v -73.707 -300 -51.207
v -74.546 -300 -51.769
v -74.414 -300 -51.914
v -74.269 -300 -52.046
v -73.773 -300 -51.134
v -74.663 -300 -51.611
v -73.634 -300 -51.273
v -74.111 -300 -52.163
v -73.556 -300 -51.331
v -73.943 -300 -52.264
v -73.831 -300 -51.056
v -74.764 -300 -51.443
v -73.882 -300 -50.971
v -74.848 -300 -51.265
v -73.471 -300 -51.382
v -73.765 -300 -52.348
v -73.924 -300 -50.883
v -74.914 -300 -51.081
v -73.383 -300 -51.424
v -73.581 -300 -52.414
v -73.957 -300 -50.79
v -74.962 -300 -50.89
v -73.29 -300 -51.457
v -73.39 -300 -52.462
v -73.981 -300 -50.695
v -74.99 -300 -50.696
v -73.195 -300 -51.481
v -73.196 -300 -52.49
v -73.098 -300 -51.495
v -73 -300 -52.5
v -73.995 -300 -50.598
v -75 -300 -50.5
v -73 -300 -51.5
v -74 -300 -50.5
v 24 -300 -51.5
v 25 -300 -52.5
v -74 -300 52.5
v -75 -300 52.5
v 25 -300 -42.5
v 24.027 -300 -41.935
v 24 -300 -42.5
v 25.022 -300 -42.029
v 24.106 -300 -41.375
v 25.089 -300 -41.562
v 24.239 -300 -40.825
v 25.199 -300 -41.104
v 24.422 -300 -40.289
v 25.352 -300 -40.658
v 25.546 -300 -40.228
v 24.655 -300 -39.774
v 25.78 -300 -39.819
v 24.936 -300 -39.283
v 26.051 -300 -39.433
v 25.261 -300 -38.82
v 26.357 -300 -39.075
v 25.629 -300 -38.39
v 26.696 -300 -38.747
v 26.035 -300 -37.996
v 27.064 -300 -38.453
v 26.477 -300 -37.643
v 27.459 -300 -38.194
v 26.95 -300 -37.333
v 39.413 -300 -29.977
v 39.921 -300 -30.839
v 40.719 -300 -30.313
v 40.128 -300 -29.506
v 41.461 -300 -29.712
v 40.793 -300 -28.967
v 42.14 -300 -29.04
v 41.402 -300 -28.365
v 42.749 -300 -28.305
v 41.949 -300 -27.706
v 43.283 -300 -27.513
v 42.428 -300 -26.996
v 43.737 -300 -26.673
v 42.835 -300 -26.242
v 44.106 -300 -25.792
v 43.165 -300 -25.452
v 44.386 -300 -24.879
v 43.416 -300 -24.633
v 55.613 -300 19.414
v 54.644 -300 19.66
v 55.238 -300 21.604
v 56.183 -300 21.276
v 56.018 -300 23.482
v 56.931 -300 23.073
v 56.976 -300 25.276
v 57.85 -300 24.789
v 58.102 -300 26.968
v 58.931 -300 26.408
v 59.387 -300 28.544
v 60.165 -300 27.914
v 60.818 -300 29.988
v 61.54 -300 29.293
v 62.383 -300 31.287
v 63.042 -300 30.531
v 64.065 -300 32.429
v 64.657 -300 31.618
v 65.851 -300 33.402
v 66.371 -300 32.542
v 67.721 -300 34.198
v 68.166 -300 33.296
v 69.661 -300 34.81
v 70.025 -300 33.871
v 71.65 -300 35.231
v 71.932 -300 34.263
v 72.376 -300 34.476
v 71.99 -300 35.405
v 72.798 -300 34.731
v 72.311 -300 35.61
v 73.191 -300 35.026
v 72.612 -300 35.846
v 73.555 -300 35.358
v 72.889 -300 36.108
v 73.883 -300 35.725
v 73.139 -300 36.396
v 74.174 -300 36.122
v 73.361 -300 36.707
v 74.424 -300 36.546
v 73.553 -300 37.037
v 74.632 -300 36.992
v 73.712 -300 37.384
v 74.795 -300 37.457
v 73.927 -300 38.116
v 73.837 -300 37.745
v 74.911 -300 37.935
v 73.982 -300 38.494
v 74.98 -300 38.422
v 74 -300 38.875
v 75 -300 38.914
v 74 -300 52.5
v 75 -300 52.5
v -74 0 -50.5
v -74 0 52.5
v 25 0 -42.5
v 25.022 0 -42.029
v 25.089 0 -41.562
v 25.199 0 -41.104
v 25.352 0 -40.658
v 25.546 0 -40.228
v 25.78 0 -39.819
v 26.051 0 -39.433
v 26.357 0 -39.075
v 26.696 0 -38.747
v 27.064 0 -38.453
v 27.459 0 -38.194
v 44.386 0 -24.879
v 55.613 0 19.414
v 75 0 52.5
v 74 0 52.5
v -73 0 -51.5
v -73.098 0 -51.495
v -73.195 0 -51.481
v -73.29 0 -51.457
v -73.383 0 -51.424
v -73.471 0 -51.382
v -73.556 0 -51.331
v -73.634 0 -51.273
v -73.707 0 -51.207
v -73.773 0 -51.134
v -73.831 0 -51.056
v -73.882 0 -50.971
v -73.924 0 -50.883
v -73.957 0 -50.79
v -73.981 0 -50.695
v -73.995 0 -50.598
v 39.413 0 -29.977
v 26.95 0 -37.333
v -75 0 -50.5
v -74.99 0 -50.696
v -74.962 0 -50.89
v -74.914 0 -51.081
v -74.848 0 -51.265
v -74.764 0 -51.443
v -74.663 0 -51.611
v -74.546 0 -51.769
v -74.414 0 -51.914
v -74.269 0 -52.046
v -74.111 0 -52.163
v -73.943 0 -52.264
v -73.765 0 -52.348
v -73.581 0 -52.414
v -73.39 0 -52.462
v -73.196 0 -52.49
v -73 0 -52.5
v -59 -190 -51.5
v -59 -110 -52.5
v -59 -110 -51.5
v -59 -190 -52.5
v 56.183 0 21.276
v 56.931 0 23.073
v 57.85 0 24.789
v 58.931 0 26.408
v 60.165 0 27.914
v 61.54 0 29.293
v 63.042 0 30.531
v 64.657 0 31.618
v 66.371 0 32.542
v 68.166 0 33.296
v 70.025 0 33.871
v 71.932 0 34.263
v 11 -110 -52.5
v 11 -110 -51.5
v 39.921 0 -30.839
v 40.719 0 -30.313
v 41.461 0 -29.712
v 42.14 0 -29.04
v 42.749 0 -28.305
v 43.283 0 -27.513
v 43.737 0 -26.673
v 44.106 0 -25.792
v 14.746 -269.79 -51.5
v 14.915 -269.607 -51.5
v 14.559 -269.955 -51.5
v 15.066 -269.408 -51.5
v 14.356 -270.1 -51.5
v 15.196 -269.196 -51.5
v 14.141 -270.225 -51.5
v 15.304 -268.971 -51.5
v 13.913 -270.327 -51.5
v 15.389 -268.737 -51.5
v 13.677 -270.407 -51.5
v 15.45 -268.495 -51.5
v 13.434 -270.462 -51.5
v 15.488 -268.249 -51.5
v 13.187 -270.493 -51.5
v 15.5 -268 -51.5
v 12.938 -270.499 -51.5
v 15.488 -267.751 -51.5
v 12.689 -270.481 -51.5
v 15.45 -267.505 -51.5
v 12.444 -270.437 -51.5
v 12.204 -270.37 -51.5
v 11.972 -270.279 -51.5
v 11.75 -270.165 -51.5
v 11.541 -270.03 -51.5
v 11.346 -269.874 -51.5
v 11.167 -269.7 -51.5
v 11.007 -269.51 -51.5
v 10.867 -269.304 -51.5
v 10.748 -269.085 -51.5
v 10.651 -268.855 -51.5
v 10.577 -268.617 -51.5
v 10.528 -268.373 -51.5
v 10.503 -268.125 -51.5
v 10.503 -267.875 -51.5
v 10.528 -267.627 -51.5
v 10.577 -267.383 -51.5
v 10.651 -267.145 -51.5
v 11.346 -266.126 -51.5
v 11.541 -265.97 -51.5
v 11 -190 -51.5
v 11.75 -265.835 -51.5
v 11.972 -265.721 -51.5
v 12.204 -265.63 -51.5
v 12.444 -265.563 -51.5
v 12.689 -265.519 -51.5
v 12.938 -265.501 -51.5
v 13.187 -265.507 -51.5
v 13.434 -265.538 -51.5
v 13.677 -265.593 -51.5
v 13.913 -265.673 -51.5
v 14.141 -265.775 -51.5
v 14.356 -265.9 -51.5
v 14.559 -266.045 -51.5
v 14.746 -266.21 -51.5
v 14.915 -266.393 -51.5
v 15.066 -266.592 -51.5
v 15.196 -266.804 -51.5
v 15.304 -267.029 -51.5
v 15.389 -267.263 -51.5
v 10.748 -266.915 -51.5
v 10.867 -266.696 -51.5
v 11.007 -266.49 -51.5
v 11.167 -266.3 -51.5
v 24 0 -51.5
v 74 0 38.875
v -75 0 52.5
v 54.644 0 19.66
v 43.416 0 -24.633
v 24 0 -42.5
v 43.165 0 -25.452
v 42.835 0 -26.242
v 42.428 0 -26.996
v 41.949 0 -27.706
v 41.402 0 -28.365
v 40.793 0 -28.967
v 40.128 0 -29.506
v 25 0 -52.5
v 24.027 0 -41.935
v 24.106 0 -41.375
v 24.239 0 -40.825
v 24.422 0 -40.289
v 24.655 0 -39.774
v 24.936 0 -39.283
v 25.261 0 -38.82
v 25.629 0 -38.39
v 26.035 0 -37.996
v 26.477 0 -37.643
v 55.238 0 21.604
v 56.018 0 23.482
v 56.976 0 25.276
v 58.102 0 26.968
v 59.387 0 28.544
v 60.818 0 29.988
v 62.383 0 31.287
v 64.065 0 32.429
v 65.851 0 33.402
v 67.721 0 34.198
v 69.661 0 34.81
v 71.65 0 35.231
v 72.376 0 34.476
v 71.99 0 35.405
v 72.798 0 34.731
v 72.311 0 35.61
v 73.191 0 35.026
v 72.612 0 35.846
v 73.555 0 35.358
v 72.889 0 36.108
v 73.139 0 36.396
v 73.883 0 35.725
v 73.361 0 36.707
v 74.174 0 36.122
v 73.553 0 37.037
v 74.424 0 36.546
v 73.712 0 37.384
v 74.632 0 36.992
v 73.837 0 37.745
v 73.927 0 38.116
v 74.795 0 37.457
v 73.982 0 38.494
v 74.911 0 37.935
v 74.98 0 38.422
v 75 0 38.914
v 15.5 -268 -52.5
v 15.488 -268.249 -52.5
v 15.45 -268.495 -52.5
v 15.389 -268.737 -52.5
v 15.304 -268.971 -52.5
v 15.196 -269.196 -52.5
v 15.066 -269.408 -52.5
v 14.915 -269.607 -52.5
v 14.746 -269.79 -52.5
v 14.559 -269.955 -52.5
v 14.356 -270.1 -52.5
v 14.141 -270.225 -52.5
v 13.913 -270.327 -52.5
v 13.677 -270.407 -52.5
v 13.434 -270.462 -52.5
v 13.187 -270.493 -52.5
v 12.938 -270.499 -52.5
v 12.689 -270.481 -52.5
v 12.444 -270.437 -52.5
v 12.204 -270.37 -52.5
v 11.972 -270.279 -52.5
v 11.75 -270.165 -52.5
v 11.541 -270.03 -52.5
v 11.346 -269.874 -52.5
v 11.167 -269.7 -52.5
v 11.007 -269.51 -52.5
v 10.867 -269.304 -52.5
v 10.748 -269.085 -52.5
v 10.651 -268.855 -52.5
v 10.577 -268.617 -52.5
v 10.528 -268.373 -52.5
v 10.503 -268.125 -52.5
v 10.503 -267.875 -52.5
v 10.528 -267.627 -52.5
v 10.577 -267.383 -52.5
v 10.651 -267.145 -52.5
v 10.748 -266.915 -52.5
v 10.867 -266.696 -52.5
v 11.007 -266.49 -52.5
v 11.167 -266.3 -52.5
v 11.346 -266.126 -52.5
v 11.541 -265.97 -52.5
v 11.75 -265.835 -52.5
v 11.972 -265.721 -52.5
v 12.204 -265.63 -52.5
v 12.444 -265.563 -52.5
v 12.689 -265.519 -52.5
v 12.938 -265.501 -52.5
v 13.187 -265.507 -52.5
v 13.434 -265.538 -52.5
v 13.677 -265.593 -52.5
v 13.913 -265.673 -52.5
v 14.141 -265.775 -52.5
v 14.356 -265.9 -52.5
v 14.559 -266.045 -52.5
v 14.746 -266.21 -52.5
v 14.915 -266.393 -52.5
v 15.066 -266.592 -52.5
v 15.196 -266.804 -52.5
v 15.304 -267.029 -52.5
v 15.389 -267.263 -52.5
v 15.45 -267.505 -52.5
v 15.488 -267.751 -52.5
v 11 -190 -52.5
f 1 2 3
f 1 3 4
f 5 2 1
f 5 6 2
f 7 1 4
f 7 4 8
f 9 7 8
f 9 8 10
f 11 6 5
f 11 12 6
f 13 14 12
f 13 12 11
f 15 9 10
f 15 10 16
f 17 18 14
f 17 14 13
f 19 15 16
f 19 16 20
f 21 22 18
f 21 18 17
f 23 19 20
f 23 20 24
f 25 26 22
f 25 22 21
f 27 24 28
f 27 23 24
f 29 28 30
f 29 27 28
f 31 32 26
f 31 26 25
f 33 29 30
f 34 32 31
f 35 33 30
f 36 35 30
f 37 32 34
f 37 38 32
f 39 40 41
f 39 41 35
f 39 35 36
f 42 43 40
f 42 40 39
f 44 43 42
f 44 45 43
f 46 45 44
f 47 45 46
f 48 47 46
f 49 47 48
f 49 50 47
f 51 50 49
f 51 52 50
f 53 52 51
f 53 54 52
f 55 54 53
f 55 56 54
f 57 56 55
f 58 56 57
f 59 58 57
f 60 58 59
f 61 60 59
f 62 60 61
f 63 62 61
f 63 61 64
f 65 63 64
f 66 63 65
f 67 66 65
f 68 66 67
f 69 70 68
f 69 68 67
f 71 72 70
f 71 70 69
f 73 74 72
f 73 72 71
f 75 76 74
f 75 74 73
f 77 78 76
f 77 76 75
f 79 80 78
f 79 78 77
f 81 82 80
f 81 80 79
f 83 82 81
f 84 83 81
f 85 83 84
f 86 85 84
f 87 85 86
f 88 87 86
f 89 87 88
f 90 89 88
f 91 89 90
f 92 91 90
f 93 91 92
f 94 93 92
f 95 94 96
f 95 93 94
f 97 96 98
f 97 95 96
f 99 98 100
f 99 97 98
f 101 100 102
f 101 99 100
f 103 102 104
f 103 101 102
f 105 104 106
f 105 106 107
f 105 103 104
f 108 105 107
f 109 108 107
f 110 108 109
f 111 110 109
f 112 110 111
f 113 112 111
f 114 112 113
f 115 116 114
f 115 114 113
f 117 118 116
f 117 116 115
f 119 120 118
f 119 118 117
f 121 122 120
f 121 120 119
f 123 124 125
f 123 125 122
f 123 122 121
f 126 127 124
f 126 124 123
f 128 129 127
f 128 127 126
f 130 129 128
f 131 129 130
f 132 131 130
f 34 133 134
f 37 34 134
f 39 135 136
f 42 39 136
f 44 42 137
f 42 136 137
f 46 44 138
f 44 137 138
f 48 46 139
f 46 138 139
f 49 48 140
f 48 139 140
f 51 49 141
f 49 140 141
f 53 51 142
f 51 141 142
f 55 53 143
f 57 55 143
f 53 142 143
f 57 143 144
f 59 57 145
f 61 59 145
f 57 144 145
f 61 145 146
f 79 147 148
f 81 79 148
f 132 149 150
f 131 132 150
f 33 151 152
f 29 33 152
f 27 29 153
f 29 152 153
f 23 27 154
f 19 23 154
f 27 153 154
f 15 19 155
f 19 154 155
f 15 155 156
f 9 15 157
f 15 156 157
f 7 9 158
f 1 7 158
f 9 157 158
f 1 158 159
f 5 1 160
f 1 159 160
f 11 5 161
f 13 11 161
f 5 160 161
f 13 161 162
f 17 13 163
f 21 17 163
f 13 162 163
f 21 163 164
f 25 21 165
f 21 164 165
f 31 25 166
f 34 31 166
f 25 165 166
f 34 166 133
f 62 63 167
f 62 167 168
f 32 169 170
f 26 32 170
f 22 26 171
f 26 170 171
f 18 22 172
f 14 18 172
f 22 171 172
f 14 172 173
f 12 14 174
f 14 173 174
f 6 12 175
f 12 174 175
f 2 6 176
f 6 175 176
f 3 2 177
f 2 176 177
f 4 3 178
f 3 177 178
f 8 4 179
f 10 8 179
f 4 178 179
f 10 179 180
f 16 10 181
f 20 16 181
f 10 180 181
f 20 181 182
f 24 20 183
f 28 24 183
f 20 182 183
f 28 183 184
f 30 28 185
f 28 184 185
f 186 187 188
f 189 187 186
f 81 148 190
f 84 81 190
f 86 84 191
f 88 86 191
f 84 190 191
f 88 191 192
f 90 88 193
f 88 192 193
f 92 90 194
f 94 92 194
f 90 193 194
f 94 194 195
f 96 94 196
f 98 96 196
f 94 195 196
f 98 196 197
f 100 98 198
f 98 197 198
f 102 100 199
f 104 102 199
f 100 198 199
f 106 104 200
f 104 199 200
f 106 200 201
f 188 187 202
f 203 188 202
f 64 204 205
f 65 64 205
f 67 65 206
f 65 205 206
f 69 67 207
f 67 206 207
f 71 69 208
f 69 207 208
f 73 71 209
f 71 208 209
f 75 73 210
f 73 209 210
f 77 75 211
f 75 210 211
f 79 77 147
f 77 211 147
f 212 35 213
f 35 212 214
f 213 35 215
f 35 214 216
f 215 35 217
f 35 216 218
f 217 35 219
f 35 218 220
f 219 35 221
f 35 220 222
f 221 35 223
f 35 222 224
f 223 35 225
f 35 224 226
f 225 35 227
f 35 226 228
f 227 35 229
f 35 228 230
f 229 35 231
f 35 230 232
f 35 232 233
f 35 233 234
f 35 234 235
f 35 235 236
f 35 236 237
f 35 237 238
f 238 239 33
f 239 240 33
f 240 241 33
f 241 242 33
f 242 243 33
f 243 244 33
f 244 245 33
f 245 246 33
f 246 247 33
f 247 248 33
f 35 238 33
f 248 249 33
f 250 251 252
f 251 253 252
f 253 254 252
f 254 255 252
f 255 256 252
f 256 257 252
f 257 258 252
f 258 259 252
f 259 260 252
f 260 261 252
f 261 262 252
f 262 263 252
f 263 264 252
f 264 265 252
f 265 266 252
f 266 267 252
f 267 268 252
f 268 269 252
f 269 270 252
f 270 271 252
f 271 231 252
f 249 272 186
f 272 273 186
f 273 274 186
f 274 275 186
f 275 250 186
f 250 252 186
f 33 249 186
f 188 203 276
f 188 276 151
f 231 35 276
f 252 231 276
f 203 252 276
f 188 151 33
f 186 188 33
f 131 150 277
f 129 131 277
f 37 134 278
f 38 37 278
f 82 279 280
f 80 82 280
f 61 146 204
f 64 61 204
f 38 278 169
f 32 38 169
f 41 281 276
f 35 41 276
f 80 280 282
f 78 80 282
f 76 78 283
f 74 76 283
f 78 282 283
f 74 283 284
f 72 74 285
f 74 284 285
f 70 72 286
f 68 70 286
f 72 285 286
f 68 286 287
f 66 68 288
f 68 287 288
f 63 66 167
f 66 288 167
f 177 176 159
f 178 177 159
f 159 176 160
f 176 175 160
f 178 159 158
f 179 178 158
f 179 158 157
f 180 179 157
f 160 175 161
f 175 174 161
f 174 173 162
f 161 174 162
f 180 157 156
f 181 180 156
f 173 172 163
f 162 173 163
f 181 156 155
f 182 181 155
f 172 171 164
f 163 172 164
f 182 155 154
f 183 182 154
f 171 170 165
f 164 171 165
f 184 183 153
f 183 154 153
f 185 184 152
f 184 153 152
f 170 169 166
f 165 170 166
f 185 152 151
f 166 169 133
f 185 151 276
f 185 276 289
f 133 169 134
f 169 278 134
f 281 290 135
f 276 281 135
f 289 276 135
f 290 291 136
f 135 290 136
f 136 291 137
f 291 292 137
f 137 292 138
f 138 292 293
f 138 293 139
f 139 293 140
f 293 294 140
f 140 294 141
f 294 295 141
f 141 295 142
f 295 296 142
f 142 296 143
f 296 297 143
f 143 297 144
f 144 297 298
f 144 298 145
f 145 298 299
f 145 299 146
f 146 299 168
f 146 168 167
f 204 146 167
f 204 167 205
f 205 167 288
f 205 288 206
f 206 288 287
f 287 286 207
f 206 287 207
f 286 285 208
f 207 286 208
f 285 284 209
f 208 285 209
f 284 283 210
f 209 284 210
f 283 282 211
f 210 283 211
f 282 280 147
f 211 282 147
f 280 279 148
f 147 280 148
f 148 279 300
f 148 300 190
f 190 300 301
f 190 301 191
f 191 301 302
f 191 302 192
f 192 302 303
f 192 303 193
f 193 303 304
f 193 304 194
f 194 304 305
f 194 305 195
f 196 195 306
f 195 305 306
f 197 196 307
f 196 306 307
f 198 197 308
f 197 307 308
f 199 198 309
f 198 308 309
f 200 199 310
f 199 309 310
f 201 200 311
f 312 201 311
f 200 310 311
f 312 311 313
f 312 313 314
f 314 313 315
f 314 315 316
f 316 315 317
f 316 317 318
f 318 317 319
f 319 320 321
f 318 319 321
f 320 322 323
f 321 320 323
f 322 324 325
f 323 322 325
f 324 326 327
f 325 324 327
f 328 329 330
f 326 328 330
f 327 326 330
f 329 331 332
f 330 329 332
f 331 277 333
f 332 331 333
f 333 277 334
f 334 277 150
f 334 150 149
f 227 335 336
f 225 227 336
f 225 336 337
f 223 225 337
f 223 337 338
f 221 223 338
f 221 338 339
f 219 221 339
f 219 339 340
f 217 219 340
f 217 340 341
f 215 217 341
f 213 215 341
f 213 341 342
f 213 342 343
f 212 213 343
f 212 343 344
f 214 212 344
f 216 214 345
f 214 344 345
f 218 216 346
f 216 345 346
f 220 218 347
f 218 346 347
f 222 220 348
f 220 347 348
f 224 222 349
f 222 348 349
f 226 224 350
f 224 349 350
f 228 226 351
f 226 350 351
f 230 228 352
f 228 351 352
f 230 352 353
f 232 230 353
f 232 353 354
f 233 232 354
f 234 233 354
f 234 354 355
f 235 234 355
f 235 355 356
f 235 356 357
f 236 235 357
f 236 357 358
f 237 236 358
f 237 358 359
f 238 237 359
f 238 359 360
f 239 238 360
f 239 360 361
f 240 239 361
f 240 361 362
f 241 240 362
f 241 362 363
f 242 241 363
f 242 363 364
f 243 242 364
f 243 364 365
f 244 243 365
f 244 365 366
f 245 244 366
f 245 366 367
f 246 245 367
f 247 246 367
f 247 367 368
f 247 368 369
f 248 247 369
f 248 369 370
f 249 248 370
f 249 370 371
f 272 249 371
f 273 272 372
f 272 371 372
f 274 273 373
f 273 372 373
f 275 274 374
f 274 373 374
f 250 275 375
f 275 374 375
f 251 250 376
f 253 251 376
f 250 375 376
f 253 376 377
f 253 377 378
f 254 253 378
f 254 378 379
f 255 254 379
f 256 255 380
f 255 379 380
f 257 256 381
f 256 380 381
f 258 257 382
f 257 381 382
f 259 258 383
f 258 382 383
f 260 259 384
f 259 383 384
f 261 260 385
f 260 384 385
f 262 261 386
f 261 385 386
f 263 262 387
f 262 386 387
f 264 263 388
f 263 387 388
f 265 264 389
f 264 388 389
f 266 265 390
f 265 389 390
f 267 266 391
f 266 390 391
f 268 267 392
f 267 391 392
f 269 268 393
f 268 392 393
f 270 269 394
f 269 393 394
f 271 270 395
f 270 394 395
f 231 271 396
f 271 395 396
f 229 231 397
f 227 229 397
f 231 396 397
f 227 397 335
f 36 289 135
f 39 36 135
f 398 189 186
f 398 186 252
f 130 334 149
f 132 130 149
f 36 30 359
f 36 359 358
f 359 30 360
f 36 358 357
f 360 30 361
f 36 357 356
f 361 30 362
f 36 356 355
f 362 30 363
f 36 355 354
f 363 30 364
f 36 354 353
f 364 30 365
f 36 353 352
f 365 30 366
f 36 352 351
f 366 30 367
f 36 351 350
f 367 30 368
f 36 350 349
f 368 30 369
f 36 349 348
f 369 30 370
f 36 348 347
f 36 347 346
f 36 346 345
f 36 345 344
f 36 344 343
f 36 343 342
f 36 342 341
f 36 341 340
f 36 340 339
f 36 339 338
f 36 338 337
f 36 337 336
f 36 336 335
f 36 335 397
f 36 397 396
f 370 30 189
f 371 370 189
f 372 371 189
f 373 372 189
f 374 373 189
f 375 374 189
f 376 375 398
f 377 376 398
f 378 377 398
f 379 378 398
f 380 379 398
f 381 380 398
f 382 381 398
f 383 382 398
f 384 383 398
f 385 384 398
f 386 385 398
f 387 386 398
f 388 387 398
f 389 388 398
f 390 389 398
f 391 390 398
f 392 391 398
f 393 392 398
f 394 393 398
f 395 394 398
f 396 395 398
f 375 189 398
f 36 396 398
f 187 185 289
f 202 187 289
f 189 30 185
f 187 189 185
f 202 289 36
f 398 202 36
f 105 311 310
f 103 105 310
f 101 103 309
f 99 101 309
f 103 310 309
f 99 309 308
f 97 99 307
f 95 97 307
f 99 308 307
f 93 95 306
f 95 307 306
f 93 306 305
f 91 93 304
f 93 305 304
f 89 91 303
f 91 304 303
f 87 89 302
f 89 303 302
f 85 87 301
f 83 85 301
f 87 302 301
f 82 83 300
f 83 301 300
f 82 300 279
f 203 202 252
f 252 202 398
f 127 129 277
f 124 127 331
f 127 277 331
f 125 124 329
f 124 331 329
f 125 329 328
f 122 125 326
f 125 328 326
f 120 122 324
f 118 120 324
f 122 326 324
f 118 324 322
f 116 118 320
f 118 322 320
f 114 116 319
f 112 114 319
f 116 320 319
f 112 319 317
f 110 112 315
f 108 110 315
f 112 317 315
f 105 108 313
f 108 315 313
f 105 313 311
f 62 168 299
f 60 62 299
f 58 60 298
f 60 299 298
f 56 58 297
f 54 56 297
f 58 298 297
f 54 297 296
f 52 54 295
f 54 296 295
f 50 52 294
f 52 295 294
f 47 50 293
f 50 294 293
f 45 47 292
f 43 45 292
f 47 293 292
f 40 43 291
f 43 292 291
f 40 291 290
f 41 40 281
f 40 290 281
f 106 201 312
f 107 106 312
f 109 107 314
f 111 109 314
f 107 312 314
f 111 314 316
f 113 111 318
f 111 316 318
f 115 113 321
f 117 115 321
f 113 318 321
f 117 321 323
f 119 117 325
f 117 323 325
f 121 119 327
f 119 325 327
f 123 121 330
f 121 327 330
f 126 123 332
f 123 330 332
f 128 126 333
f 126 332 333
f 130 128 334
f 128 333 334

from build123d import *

# Parameters (mm, degrees)
F1_DEPTH = 300
F2_W     = 70
F2_H     = 80
F3_DEPTH = 25
F4_DEPTH = 25
F5_DEPTH = 25
F6_R     = 2.5
F7_DEPTH = 25


with BuildPart() as f1:
    # F0 (on Front) → F1 (new body)
    with BuildSketch(Plane.XZ):
        with BuildLine():
            Line((75, 38.914216), (75, 52.5))
            Line((75, 52.5), (74, 52.5))
            Line((74, 52.5), (74, 38.875))
            ThreePointArc((74, 38.875), (73.361451, 36.706903), (71.649678, 35.231024))
            ThreePointArc((71.649678, 35.231024), (60.8185, 29.988223), (54.643786, 19.659898))
            Line((54.643786, 19.659898), (43.416317, -24.63337))
            ThreePointArc((43.416317, -24.63337), (41.948954, -27.705545), (39.413109, -29.977308))
            Line((39.413109, -29.977308), (26.950339, -37.332837))
            ThreePointArc((26.950339, -37.332837), (24.789532, -39.524934), (24, -42.5))
            Line((24, -42.5), (24, -51.5))
            Line((24, -51.5), (-73, -51.5))
            ThreePointArc((-73, -51.5), (-73.707107, -51.207107), (-74, -50.5))
            Line((-74, -50.5), (-74, 52.5))
            Line((-74, 52.5), (-75, 52.5))
            Line((-75, 52.5), (-75, -50.5))
            ThreePointArc((-75, -50.5), (-74.414214, -51.914214), (-73, -52.5))
            Line((-73, -52.5), (25, -52.5))
            Line((25, -52.5), (25, -42.5))
            ThreePointArc((25, -42.5), (25.657943, -40.020778), (27.458616, -38.194031))
            Line((27.458616, -38.194031), (39.921386, -30.838502))
            ThreePointArc((39.921386, -30.838502), (42.749295, -28.305091), (44.385661, -24.87908))
            Line((44.385661, -24.87908), (55.613129, 19.414189))
            ThreePointArc((55.613129, 19.414189), (61.539869, 29.29273), (71.932405, 34.263346))
            ThreePointArc((71.932405, 34.263346), (74.173992, 36.121942), (75, 38.914216))
        make_face()
    extrude(amount=F1_DEPTH)

    # F2 (on face) → F3 (cut)
    with BuildSketch(Plane(origin=(0, 0, -52.5), x_dir=(1, 0, 0), z_dir=(0, 0, -1))):
        with Locations((-24, 150)):
            Rectangle(F2_W, F2_H)
    extrude(amount=-F3_DEPTH, mode=Mode.SUBTRACT)

    # F2 (on face) → F4 (cut)
    with BuildSketch(Plane(origin=(0, 0, -52.5), x_dir=(1, 0, 0), z_dir=(0, 0, -1))):
        with Locations((-24, 150)):
            Rectangle(F2_W, F2_H)
    extrude(amount=-F4_DEPTH, mode=Mode.SUBTRACT)

    # F2 (on face) → F5 (cut)
    with BuildSketch(Plane(origin=(0, 0, -52.5), x_dir=(1, 0, 0), z_dir=(0, 0, -1))):
        with Locations((-24, 150)):
            Rectangle(F2_W, F2_H)
    extrude(amount=-F5_DEPTH, mode=Mode.SUBTRACT)

    # F6 (on face) → F7 (cut)
    with BuildSketch(Plane(origin=(0, 0, -52.5), x_dir=(1, 0, 0), z_dir=(0, 0, -1))):
        with Locations((13, 268)):
            Circle(F6_R)
    extrude(amount=-F7_DEPTH, mode=Mode.SUBTRACT)


solid = f1.part
